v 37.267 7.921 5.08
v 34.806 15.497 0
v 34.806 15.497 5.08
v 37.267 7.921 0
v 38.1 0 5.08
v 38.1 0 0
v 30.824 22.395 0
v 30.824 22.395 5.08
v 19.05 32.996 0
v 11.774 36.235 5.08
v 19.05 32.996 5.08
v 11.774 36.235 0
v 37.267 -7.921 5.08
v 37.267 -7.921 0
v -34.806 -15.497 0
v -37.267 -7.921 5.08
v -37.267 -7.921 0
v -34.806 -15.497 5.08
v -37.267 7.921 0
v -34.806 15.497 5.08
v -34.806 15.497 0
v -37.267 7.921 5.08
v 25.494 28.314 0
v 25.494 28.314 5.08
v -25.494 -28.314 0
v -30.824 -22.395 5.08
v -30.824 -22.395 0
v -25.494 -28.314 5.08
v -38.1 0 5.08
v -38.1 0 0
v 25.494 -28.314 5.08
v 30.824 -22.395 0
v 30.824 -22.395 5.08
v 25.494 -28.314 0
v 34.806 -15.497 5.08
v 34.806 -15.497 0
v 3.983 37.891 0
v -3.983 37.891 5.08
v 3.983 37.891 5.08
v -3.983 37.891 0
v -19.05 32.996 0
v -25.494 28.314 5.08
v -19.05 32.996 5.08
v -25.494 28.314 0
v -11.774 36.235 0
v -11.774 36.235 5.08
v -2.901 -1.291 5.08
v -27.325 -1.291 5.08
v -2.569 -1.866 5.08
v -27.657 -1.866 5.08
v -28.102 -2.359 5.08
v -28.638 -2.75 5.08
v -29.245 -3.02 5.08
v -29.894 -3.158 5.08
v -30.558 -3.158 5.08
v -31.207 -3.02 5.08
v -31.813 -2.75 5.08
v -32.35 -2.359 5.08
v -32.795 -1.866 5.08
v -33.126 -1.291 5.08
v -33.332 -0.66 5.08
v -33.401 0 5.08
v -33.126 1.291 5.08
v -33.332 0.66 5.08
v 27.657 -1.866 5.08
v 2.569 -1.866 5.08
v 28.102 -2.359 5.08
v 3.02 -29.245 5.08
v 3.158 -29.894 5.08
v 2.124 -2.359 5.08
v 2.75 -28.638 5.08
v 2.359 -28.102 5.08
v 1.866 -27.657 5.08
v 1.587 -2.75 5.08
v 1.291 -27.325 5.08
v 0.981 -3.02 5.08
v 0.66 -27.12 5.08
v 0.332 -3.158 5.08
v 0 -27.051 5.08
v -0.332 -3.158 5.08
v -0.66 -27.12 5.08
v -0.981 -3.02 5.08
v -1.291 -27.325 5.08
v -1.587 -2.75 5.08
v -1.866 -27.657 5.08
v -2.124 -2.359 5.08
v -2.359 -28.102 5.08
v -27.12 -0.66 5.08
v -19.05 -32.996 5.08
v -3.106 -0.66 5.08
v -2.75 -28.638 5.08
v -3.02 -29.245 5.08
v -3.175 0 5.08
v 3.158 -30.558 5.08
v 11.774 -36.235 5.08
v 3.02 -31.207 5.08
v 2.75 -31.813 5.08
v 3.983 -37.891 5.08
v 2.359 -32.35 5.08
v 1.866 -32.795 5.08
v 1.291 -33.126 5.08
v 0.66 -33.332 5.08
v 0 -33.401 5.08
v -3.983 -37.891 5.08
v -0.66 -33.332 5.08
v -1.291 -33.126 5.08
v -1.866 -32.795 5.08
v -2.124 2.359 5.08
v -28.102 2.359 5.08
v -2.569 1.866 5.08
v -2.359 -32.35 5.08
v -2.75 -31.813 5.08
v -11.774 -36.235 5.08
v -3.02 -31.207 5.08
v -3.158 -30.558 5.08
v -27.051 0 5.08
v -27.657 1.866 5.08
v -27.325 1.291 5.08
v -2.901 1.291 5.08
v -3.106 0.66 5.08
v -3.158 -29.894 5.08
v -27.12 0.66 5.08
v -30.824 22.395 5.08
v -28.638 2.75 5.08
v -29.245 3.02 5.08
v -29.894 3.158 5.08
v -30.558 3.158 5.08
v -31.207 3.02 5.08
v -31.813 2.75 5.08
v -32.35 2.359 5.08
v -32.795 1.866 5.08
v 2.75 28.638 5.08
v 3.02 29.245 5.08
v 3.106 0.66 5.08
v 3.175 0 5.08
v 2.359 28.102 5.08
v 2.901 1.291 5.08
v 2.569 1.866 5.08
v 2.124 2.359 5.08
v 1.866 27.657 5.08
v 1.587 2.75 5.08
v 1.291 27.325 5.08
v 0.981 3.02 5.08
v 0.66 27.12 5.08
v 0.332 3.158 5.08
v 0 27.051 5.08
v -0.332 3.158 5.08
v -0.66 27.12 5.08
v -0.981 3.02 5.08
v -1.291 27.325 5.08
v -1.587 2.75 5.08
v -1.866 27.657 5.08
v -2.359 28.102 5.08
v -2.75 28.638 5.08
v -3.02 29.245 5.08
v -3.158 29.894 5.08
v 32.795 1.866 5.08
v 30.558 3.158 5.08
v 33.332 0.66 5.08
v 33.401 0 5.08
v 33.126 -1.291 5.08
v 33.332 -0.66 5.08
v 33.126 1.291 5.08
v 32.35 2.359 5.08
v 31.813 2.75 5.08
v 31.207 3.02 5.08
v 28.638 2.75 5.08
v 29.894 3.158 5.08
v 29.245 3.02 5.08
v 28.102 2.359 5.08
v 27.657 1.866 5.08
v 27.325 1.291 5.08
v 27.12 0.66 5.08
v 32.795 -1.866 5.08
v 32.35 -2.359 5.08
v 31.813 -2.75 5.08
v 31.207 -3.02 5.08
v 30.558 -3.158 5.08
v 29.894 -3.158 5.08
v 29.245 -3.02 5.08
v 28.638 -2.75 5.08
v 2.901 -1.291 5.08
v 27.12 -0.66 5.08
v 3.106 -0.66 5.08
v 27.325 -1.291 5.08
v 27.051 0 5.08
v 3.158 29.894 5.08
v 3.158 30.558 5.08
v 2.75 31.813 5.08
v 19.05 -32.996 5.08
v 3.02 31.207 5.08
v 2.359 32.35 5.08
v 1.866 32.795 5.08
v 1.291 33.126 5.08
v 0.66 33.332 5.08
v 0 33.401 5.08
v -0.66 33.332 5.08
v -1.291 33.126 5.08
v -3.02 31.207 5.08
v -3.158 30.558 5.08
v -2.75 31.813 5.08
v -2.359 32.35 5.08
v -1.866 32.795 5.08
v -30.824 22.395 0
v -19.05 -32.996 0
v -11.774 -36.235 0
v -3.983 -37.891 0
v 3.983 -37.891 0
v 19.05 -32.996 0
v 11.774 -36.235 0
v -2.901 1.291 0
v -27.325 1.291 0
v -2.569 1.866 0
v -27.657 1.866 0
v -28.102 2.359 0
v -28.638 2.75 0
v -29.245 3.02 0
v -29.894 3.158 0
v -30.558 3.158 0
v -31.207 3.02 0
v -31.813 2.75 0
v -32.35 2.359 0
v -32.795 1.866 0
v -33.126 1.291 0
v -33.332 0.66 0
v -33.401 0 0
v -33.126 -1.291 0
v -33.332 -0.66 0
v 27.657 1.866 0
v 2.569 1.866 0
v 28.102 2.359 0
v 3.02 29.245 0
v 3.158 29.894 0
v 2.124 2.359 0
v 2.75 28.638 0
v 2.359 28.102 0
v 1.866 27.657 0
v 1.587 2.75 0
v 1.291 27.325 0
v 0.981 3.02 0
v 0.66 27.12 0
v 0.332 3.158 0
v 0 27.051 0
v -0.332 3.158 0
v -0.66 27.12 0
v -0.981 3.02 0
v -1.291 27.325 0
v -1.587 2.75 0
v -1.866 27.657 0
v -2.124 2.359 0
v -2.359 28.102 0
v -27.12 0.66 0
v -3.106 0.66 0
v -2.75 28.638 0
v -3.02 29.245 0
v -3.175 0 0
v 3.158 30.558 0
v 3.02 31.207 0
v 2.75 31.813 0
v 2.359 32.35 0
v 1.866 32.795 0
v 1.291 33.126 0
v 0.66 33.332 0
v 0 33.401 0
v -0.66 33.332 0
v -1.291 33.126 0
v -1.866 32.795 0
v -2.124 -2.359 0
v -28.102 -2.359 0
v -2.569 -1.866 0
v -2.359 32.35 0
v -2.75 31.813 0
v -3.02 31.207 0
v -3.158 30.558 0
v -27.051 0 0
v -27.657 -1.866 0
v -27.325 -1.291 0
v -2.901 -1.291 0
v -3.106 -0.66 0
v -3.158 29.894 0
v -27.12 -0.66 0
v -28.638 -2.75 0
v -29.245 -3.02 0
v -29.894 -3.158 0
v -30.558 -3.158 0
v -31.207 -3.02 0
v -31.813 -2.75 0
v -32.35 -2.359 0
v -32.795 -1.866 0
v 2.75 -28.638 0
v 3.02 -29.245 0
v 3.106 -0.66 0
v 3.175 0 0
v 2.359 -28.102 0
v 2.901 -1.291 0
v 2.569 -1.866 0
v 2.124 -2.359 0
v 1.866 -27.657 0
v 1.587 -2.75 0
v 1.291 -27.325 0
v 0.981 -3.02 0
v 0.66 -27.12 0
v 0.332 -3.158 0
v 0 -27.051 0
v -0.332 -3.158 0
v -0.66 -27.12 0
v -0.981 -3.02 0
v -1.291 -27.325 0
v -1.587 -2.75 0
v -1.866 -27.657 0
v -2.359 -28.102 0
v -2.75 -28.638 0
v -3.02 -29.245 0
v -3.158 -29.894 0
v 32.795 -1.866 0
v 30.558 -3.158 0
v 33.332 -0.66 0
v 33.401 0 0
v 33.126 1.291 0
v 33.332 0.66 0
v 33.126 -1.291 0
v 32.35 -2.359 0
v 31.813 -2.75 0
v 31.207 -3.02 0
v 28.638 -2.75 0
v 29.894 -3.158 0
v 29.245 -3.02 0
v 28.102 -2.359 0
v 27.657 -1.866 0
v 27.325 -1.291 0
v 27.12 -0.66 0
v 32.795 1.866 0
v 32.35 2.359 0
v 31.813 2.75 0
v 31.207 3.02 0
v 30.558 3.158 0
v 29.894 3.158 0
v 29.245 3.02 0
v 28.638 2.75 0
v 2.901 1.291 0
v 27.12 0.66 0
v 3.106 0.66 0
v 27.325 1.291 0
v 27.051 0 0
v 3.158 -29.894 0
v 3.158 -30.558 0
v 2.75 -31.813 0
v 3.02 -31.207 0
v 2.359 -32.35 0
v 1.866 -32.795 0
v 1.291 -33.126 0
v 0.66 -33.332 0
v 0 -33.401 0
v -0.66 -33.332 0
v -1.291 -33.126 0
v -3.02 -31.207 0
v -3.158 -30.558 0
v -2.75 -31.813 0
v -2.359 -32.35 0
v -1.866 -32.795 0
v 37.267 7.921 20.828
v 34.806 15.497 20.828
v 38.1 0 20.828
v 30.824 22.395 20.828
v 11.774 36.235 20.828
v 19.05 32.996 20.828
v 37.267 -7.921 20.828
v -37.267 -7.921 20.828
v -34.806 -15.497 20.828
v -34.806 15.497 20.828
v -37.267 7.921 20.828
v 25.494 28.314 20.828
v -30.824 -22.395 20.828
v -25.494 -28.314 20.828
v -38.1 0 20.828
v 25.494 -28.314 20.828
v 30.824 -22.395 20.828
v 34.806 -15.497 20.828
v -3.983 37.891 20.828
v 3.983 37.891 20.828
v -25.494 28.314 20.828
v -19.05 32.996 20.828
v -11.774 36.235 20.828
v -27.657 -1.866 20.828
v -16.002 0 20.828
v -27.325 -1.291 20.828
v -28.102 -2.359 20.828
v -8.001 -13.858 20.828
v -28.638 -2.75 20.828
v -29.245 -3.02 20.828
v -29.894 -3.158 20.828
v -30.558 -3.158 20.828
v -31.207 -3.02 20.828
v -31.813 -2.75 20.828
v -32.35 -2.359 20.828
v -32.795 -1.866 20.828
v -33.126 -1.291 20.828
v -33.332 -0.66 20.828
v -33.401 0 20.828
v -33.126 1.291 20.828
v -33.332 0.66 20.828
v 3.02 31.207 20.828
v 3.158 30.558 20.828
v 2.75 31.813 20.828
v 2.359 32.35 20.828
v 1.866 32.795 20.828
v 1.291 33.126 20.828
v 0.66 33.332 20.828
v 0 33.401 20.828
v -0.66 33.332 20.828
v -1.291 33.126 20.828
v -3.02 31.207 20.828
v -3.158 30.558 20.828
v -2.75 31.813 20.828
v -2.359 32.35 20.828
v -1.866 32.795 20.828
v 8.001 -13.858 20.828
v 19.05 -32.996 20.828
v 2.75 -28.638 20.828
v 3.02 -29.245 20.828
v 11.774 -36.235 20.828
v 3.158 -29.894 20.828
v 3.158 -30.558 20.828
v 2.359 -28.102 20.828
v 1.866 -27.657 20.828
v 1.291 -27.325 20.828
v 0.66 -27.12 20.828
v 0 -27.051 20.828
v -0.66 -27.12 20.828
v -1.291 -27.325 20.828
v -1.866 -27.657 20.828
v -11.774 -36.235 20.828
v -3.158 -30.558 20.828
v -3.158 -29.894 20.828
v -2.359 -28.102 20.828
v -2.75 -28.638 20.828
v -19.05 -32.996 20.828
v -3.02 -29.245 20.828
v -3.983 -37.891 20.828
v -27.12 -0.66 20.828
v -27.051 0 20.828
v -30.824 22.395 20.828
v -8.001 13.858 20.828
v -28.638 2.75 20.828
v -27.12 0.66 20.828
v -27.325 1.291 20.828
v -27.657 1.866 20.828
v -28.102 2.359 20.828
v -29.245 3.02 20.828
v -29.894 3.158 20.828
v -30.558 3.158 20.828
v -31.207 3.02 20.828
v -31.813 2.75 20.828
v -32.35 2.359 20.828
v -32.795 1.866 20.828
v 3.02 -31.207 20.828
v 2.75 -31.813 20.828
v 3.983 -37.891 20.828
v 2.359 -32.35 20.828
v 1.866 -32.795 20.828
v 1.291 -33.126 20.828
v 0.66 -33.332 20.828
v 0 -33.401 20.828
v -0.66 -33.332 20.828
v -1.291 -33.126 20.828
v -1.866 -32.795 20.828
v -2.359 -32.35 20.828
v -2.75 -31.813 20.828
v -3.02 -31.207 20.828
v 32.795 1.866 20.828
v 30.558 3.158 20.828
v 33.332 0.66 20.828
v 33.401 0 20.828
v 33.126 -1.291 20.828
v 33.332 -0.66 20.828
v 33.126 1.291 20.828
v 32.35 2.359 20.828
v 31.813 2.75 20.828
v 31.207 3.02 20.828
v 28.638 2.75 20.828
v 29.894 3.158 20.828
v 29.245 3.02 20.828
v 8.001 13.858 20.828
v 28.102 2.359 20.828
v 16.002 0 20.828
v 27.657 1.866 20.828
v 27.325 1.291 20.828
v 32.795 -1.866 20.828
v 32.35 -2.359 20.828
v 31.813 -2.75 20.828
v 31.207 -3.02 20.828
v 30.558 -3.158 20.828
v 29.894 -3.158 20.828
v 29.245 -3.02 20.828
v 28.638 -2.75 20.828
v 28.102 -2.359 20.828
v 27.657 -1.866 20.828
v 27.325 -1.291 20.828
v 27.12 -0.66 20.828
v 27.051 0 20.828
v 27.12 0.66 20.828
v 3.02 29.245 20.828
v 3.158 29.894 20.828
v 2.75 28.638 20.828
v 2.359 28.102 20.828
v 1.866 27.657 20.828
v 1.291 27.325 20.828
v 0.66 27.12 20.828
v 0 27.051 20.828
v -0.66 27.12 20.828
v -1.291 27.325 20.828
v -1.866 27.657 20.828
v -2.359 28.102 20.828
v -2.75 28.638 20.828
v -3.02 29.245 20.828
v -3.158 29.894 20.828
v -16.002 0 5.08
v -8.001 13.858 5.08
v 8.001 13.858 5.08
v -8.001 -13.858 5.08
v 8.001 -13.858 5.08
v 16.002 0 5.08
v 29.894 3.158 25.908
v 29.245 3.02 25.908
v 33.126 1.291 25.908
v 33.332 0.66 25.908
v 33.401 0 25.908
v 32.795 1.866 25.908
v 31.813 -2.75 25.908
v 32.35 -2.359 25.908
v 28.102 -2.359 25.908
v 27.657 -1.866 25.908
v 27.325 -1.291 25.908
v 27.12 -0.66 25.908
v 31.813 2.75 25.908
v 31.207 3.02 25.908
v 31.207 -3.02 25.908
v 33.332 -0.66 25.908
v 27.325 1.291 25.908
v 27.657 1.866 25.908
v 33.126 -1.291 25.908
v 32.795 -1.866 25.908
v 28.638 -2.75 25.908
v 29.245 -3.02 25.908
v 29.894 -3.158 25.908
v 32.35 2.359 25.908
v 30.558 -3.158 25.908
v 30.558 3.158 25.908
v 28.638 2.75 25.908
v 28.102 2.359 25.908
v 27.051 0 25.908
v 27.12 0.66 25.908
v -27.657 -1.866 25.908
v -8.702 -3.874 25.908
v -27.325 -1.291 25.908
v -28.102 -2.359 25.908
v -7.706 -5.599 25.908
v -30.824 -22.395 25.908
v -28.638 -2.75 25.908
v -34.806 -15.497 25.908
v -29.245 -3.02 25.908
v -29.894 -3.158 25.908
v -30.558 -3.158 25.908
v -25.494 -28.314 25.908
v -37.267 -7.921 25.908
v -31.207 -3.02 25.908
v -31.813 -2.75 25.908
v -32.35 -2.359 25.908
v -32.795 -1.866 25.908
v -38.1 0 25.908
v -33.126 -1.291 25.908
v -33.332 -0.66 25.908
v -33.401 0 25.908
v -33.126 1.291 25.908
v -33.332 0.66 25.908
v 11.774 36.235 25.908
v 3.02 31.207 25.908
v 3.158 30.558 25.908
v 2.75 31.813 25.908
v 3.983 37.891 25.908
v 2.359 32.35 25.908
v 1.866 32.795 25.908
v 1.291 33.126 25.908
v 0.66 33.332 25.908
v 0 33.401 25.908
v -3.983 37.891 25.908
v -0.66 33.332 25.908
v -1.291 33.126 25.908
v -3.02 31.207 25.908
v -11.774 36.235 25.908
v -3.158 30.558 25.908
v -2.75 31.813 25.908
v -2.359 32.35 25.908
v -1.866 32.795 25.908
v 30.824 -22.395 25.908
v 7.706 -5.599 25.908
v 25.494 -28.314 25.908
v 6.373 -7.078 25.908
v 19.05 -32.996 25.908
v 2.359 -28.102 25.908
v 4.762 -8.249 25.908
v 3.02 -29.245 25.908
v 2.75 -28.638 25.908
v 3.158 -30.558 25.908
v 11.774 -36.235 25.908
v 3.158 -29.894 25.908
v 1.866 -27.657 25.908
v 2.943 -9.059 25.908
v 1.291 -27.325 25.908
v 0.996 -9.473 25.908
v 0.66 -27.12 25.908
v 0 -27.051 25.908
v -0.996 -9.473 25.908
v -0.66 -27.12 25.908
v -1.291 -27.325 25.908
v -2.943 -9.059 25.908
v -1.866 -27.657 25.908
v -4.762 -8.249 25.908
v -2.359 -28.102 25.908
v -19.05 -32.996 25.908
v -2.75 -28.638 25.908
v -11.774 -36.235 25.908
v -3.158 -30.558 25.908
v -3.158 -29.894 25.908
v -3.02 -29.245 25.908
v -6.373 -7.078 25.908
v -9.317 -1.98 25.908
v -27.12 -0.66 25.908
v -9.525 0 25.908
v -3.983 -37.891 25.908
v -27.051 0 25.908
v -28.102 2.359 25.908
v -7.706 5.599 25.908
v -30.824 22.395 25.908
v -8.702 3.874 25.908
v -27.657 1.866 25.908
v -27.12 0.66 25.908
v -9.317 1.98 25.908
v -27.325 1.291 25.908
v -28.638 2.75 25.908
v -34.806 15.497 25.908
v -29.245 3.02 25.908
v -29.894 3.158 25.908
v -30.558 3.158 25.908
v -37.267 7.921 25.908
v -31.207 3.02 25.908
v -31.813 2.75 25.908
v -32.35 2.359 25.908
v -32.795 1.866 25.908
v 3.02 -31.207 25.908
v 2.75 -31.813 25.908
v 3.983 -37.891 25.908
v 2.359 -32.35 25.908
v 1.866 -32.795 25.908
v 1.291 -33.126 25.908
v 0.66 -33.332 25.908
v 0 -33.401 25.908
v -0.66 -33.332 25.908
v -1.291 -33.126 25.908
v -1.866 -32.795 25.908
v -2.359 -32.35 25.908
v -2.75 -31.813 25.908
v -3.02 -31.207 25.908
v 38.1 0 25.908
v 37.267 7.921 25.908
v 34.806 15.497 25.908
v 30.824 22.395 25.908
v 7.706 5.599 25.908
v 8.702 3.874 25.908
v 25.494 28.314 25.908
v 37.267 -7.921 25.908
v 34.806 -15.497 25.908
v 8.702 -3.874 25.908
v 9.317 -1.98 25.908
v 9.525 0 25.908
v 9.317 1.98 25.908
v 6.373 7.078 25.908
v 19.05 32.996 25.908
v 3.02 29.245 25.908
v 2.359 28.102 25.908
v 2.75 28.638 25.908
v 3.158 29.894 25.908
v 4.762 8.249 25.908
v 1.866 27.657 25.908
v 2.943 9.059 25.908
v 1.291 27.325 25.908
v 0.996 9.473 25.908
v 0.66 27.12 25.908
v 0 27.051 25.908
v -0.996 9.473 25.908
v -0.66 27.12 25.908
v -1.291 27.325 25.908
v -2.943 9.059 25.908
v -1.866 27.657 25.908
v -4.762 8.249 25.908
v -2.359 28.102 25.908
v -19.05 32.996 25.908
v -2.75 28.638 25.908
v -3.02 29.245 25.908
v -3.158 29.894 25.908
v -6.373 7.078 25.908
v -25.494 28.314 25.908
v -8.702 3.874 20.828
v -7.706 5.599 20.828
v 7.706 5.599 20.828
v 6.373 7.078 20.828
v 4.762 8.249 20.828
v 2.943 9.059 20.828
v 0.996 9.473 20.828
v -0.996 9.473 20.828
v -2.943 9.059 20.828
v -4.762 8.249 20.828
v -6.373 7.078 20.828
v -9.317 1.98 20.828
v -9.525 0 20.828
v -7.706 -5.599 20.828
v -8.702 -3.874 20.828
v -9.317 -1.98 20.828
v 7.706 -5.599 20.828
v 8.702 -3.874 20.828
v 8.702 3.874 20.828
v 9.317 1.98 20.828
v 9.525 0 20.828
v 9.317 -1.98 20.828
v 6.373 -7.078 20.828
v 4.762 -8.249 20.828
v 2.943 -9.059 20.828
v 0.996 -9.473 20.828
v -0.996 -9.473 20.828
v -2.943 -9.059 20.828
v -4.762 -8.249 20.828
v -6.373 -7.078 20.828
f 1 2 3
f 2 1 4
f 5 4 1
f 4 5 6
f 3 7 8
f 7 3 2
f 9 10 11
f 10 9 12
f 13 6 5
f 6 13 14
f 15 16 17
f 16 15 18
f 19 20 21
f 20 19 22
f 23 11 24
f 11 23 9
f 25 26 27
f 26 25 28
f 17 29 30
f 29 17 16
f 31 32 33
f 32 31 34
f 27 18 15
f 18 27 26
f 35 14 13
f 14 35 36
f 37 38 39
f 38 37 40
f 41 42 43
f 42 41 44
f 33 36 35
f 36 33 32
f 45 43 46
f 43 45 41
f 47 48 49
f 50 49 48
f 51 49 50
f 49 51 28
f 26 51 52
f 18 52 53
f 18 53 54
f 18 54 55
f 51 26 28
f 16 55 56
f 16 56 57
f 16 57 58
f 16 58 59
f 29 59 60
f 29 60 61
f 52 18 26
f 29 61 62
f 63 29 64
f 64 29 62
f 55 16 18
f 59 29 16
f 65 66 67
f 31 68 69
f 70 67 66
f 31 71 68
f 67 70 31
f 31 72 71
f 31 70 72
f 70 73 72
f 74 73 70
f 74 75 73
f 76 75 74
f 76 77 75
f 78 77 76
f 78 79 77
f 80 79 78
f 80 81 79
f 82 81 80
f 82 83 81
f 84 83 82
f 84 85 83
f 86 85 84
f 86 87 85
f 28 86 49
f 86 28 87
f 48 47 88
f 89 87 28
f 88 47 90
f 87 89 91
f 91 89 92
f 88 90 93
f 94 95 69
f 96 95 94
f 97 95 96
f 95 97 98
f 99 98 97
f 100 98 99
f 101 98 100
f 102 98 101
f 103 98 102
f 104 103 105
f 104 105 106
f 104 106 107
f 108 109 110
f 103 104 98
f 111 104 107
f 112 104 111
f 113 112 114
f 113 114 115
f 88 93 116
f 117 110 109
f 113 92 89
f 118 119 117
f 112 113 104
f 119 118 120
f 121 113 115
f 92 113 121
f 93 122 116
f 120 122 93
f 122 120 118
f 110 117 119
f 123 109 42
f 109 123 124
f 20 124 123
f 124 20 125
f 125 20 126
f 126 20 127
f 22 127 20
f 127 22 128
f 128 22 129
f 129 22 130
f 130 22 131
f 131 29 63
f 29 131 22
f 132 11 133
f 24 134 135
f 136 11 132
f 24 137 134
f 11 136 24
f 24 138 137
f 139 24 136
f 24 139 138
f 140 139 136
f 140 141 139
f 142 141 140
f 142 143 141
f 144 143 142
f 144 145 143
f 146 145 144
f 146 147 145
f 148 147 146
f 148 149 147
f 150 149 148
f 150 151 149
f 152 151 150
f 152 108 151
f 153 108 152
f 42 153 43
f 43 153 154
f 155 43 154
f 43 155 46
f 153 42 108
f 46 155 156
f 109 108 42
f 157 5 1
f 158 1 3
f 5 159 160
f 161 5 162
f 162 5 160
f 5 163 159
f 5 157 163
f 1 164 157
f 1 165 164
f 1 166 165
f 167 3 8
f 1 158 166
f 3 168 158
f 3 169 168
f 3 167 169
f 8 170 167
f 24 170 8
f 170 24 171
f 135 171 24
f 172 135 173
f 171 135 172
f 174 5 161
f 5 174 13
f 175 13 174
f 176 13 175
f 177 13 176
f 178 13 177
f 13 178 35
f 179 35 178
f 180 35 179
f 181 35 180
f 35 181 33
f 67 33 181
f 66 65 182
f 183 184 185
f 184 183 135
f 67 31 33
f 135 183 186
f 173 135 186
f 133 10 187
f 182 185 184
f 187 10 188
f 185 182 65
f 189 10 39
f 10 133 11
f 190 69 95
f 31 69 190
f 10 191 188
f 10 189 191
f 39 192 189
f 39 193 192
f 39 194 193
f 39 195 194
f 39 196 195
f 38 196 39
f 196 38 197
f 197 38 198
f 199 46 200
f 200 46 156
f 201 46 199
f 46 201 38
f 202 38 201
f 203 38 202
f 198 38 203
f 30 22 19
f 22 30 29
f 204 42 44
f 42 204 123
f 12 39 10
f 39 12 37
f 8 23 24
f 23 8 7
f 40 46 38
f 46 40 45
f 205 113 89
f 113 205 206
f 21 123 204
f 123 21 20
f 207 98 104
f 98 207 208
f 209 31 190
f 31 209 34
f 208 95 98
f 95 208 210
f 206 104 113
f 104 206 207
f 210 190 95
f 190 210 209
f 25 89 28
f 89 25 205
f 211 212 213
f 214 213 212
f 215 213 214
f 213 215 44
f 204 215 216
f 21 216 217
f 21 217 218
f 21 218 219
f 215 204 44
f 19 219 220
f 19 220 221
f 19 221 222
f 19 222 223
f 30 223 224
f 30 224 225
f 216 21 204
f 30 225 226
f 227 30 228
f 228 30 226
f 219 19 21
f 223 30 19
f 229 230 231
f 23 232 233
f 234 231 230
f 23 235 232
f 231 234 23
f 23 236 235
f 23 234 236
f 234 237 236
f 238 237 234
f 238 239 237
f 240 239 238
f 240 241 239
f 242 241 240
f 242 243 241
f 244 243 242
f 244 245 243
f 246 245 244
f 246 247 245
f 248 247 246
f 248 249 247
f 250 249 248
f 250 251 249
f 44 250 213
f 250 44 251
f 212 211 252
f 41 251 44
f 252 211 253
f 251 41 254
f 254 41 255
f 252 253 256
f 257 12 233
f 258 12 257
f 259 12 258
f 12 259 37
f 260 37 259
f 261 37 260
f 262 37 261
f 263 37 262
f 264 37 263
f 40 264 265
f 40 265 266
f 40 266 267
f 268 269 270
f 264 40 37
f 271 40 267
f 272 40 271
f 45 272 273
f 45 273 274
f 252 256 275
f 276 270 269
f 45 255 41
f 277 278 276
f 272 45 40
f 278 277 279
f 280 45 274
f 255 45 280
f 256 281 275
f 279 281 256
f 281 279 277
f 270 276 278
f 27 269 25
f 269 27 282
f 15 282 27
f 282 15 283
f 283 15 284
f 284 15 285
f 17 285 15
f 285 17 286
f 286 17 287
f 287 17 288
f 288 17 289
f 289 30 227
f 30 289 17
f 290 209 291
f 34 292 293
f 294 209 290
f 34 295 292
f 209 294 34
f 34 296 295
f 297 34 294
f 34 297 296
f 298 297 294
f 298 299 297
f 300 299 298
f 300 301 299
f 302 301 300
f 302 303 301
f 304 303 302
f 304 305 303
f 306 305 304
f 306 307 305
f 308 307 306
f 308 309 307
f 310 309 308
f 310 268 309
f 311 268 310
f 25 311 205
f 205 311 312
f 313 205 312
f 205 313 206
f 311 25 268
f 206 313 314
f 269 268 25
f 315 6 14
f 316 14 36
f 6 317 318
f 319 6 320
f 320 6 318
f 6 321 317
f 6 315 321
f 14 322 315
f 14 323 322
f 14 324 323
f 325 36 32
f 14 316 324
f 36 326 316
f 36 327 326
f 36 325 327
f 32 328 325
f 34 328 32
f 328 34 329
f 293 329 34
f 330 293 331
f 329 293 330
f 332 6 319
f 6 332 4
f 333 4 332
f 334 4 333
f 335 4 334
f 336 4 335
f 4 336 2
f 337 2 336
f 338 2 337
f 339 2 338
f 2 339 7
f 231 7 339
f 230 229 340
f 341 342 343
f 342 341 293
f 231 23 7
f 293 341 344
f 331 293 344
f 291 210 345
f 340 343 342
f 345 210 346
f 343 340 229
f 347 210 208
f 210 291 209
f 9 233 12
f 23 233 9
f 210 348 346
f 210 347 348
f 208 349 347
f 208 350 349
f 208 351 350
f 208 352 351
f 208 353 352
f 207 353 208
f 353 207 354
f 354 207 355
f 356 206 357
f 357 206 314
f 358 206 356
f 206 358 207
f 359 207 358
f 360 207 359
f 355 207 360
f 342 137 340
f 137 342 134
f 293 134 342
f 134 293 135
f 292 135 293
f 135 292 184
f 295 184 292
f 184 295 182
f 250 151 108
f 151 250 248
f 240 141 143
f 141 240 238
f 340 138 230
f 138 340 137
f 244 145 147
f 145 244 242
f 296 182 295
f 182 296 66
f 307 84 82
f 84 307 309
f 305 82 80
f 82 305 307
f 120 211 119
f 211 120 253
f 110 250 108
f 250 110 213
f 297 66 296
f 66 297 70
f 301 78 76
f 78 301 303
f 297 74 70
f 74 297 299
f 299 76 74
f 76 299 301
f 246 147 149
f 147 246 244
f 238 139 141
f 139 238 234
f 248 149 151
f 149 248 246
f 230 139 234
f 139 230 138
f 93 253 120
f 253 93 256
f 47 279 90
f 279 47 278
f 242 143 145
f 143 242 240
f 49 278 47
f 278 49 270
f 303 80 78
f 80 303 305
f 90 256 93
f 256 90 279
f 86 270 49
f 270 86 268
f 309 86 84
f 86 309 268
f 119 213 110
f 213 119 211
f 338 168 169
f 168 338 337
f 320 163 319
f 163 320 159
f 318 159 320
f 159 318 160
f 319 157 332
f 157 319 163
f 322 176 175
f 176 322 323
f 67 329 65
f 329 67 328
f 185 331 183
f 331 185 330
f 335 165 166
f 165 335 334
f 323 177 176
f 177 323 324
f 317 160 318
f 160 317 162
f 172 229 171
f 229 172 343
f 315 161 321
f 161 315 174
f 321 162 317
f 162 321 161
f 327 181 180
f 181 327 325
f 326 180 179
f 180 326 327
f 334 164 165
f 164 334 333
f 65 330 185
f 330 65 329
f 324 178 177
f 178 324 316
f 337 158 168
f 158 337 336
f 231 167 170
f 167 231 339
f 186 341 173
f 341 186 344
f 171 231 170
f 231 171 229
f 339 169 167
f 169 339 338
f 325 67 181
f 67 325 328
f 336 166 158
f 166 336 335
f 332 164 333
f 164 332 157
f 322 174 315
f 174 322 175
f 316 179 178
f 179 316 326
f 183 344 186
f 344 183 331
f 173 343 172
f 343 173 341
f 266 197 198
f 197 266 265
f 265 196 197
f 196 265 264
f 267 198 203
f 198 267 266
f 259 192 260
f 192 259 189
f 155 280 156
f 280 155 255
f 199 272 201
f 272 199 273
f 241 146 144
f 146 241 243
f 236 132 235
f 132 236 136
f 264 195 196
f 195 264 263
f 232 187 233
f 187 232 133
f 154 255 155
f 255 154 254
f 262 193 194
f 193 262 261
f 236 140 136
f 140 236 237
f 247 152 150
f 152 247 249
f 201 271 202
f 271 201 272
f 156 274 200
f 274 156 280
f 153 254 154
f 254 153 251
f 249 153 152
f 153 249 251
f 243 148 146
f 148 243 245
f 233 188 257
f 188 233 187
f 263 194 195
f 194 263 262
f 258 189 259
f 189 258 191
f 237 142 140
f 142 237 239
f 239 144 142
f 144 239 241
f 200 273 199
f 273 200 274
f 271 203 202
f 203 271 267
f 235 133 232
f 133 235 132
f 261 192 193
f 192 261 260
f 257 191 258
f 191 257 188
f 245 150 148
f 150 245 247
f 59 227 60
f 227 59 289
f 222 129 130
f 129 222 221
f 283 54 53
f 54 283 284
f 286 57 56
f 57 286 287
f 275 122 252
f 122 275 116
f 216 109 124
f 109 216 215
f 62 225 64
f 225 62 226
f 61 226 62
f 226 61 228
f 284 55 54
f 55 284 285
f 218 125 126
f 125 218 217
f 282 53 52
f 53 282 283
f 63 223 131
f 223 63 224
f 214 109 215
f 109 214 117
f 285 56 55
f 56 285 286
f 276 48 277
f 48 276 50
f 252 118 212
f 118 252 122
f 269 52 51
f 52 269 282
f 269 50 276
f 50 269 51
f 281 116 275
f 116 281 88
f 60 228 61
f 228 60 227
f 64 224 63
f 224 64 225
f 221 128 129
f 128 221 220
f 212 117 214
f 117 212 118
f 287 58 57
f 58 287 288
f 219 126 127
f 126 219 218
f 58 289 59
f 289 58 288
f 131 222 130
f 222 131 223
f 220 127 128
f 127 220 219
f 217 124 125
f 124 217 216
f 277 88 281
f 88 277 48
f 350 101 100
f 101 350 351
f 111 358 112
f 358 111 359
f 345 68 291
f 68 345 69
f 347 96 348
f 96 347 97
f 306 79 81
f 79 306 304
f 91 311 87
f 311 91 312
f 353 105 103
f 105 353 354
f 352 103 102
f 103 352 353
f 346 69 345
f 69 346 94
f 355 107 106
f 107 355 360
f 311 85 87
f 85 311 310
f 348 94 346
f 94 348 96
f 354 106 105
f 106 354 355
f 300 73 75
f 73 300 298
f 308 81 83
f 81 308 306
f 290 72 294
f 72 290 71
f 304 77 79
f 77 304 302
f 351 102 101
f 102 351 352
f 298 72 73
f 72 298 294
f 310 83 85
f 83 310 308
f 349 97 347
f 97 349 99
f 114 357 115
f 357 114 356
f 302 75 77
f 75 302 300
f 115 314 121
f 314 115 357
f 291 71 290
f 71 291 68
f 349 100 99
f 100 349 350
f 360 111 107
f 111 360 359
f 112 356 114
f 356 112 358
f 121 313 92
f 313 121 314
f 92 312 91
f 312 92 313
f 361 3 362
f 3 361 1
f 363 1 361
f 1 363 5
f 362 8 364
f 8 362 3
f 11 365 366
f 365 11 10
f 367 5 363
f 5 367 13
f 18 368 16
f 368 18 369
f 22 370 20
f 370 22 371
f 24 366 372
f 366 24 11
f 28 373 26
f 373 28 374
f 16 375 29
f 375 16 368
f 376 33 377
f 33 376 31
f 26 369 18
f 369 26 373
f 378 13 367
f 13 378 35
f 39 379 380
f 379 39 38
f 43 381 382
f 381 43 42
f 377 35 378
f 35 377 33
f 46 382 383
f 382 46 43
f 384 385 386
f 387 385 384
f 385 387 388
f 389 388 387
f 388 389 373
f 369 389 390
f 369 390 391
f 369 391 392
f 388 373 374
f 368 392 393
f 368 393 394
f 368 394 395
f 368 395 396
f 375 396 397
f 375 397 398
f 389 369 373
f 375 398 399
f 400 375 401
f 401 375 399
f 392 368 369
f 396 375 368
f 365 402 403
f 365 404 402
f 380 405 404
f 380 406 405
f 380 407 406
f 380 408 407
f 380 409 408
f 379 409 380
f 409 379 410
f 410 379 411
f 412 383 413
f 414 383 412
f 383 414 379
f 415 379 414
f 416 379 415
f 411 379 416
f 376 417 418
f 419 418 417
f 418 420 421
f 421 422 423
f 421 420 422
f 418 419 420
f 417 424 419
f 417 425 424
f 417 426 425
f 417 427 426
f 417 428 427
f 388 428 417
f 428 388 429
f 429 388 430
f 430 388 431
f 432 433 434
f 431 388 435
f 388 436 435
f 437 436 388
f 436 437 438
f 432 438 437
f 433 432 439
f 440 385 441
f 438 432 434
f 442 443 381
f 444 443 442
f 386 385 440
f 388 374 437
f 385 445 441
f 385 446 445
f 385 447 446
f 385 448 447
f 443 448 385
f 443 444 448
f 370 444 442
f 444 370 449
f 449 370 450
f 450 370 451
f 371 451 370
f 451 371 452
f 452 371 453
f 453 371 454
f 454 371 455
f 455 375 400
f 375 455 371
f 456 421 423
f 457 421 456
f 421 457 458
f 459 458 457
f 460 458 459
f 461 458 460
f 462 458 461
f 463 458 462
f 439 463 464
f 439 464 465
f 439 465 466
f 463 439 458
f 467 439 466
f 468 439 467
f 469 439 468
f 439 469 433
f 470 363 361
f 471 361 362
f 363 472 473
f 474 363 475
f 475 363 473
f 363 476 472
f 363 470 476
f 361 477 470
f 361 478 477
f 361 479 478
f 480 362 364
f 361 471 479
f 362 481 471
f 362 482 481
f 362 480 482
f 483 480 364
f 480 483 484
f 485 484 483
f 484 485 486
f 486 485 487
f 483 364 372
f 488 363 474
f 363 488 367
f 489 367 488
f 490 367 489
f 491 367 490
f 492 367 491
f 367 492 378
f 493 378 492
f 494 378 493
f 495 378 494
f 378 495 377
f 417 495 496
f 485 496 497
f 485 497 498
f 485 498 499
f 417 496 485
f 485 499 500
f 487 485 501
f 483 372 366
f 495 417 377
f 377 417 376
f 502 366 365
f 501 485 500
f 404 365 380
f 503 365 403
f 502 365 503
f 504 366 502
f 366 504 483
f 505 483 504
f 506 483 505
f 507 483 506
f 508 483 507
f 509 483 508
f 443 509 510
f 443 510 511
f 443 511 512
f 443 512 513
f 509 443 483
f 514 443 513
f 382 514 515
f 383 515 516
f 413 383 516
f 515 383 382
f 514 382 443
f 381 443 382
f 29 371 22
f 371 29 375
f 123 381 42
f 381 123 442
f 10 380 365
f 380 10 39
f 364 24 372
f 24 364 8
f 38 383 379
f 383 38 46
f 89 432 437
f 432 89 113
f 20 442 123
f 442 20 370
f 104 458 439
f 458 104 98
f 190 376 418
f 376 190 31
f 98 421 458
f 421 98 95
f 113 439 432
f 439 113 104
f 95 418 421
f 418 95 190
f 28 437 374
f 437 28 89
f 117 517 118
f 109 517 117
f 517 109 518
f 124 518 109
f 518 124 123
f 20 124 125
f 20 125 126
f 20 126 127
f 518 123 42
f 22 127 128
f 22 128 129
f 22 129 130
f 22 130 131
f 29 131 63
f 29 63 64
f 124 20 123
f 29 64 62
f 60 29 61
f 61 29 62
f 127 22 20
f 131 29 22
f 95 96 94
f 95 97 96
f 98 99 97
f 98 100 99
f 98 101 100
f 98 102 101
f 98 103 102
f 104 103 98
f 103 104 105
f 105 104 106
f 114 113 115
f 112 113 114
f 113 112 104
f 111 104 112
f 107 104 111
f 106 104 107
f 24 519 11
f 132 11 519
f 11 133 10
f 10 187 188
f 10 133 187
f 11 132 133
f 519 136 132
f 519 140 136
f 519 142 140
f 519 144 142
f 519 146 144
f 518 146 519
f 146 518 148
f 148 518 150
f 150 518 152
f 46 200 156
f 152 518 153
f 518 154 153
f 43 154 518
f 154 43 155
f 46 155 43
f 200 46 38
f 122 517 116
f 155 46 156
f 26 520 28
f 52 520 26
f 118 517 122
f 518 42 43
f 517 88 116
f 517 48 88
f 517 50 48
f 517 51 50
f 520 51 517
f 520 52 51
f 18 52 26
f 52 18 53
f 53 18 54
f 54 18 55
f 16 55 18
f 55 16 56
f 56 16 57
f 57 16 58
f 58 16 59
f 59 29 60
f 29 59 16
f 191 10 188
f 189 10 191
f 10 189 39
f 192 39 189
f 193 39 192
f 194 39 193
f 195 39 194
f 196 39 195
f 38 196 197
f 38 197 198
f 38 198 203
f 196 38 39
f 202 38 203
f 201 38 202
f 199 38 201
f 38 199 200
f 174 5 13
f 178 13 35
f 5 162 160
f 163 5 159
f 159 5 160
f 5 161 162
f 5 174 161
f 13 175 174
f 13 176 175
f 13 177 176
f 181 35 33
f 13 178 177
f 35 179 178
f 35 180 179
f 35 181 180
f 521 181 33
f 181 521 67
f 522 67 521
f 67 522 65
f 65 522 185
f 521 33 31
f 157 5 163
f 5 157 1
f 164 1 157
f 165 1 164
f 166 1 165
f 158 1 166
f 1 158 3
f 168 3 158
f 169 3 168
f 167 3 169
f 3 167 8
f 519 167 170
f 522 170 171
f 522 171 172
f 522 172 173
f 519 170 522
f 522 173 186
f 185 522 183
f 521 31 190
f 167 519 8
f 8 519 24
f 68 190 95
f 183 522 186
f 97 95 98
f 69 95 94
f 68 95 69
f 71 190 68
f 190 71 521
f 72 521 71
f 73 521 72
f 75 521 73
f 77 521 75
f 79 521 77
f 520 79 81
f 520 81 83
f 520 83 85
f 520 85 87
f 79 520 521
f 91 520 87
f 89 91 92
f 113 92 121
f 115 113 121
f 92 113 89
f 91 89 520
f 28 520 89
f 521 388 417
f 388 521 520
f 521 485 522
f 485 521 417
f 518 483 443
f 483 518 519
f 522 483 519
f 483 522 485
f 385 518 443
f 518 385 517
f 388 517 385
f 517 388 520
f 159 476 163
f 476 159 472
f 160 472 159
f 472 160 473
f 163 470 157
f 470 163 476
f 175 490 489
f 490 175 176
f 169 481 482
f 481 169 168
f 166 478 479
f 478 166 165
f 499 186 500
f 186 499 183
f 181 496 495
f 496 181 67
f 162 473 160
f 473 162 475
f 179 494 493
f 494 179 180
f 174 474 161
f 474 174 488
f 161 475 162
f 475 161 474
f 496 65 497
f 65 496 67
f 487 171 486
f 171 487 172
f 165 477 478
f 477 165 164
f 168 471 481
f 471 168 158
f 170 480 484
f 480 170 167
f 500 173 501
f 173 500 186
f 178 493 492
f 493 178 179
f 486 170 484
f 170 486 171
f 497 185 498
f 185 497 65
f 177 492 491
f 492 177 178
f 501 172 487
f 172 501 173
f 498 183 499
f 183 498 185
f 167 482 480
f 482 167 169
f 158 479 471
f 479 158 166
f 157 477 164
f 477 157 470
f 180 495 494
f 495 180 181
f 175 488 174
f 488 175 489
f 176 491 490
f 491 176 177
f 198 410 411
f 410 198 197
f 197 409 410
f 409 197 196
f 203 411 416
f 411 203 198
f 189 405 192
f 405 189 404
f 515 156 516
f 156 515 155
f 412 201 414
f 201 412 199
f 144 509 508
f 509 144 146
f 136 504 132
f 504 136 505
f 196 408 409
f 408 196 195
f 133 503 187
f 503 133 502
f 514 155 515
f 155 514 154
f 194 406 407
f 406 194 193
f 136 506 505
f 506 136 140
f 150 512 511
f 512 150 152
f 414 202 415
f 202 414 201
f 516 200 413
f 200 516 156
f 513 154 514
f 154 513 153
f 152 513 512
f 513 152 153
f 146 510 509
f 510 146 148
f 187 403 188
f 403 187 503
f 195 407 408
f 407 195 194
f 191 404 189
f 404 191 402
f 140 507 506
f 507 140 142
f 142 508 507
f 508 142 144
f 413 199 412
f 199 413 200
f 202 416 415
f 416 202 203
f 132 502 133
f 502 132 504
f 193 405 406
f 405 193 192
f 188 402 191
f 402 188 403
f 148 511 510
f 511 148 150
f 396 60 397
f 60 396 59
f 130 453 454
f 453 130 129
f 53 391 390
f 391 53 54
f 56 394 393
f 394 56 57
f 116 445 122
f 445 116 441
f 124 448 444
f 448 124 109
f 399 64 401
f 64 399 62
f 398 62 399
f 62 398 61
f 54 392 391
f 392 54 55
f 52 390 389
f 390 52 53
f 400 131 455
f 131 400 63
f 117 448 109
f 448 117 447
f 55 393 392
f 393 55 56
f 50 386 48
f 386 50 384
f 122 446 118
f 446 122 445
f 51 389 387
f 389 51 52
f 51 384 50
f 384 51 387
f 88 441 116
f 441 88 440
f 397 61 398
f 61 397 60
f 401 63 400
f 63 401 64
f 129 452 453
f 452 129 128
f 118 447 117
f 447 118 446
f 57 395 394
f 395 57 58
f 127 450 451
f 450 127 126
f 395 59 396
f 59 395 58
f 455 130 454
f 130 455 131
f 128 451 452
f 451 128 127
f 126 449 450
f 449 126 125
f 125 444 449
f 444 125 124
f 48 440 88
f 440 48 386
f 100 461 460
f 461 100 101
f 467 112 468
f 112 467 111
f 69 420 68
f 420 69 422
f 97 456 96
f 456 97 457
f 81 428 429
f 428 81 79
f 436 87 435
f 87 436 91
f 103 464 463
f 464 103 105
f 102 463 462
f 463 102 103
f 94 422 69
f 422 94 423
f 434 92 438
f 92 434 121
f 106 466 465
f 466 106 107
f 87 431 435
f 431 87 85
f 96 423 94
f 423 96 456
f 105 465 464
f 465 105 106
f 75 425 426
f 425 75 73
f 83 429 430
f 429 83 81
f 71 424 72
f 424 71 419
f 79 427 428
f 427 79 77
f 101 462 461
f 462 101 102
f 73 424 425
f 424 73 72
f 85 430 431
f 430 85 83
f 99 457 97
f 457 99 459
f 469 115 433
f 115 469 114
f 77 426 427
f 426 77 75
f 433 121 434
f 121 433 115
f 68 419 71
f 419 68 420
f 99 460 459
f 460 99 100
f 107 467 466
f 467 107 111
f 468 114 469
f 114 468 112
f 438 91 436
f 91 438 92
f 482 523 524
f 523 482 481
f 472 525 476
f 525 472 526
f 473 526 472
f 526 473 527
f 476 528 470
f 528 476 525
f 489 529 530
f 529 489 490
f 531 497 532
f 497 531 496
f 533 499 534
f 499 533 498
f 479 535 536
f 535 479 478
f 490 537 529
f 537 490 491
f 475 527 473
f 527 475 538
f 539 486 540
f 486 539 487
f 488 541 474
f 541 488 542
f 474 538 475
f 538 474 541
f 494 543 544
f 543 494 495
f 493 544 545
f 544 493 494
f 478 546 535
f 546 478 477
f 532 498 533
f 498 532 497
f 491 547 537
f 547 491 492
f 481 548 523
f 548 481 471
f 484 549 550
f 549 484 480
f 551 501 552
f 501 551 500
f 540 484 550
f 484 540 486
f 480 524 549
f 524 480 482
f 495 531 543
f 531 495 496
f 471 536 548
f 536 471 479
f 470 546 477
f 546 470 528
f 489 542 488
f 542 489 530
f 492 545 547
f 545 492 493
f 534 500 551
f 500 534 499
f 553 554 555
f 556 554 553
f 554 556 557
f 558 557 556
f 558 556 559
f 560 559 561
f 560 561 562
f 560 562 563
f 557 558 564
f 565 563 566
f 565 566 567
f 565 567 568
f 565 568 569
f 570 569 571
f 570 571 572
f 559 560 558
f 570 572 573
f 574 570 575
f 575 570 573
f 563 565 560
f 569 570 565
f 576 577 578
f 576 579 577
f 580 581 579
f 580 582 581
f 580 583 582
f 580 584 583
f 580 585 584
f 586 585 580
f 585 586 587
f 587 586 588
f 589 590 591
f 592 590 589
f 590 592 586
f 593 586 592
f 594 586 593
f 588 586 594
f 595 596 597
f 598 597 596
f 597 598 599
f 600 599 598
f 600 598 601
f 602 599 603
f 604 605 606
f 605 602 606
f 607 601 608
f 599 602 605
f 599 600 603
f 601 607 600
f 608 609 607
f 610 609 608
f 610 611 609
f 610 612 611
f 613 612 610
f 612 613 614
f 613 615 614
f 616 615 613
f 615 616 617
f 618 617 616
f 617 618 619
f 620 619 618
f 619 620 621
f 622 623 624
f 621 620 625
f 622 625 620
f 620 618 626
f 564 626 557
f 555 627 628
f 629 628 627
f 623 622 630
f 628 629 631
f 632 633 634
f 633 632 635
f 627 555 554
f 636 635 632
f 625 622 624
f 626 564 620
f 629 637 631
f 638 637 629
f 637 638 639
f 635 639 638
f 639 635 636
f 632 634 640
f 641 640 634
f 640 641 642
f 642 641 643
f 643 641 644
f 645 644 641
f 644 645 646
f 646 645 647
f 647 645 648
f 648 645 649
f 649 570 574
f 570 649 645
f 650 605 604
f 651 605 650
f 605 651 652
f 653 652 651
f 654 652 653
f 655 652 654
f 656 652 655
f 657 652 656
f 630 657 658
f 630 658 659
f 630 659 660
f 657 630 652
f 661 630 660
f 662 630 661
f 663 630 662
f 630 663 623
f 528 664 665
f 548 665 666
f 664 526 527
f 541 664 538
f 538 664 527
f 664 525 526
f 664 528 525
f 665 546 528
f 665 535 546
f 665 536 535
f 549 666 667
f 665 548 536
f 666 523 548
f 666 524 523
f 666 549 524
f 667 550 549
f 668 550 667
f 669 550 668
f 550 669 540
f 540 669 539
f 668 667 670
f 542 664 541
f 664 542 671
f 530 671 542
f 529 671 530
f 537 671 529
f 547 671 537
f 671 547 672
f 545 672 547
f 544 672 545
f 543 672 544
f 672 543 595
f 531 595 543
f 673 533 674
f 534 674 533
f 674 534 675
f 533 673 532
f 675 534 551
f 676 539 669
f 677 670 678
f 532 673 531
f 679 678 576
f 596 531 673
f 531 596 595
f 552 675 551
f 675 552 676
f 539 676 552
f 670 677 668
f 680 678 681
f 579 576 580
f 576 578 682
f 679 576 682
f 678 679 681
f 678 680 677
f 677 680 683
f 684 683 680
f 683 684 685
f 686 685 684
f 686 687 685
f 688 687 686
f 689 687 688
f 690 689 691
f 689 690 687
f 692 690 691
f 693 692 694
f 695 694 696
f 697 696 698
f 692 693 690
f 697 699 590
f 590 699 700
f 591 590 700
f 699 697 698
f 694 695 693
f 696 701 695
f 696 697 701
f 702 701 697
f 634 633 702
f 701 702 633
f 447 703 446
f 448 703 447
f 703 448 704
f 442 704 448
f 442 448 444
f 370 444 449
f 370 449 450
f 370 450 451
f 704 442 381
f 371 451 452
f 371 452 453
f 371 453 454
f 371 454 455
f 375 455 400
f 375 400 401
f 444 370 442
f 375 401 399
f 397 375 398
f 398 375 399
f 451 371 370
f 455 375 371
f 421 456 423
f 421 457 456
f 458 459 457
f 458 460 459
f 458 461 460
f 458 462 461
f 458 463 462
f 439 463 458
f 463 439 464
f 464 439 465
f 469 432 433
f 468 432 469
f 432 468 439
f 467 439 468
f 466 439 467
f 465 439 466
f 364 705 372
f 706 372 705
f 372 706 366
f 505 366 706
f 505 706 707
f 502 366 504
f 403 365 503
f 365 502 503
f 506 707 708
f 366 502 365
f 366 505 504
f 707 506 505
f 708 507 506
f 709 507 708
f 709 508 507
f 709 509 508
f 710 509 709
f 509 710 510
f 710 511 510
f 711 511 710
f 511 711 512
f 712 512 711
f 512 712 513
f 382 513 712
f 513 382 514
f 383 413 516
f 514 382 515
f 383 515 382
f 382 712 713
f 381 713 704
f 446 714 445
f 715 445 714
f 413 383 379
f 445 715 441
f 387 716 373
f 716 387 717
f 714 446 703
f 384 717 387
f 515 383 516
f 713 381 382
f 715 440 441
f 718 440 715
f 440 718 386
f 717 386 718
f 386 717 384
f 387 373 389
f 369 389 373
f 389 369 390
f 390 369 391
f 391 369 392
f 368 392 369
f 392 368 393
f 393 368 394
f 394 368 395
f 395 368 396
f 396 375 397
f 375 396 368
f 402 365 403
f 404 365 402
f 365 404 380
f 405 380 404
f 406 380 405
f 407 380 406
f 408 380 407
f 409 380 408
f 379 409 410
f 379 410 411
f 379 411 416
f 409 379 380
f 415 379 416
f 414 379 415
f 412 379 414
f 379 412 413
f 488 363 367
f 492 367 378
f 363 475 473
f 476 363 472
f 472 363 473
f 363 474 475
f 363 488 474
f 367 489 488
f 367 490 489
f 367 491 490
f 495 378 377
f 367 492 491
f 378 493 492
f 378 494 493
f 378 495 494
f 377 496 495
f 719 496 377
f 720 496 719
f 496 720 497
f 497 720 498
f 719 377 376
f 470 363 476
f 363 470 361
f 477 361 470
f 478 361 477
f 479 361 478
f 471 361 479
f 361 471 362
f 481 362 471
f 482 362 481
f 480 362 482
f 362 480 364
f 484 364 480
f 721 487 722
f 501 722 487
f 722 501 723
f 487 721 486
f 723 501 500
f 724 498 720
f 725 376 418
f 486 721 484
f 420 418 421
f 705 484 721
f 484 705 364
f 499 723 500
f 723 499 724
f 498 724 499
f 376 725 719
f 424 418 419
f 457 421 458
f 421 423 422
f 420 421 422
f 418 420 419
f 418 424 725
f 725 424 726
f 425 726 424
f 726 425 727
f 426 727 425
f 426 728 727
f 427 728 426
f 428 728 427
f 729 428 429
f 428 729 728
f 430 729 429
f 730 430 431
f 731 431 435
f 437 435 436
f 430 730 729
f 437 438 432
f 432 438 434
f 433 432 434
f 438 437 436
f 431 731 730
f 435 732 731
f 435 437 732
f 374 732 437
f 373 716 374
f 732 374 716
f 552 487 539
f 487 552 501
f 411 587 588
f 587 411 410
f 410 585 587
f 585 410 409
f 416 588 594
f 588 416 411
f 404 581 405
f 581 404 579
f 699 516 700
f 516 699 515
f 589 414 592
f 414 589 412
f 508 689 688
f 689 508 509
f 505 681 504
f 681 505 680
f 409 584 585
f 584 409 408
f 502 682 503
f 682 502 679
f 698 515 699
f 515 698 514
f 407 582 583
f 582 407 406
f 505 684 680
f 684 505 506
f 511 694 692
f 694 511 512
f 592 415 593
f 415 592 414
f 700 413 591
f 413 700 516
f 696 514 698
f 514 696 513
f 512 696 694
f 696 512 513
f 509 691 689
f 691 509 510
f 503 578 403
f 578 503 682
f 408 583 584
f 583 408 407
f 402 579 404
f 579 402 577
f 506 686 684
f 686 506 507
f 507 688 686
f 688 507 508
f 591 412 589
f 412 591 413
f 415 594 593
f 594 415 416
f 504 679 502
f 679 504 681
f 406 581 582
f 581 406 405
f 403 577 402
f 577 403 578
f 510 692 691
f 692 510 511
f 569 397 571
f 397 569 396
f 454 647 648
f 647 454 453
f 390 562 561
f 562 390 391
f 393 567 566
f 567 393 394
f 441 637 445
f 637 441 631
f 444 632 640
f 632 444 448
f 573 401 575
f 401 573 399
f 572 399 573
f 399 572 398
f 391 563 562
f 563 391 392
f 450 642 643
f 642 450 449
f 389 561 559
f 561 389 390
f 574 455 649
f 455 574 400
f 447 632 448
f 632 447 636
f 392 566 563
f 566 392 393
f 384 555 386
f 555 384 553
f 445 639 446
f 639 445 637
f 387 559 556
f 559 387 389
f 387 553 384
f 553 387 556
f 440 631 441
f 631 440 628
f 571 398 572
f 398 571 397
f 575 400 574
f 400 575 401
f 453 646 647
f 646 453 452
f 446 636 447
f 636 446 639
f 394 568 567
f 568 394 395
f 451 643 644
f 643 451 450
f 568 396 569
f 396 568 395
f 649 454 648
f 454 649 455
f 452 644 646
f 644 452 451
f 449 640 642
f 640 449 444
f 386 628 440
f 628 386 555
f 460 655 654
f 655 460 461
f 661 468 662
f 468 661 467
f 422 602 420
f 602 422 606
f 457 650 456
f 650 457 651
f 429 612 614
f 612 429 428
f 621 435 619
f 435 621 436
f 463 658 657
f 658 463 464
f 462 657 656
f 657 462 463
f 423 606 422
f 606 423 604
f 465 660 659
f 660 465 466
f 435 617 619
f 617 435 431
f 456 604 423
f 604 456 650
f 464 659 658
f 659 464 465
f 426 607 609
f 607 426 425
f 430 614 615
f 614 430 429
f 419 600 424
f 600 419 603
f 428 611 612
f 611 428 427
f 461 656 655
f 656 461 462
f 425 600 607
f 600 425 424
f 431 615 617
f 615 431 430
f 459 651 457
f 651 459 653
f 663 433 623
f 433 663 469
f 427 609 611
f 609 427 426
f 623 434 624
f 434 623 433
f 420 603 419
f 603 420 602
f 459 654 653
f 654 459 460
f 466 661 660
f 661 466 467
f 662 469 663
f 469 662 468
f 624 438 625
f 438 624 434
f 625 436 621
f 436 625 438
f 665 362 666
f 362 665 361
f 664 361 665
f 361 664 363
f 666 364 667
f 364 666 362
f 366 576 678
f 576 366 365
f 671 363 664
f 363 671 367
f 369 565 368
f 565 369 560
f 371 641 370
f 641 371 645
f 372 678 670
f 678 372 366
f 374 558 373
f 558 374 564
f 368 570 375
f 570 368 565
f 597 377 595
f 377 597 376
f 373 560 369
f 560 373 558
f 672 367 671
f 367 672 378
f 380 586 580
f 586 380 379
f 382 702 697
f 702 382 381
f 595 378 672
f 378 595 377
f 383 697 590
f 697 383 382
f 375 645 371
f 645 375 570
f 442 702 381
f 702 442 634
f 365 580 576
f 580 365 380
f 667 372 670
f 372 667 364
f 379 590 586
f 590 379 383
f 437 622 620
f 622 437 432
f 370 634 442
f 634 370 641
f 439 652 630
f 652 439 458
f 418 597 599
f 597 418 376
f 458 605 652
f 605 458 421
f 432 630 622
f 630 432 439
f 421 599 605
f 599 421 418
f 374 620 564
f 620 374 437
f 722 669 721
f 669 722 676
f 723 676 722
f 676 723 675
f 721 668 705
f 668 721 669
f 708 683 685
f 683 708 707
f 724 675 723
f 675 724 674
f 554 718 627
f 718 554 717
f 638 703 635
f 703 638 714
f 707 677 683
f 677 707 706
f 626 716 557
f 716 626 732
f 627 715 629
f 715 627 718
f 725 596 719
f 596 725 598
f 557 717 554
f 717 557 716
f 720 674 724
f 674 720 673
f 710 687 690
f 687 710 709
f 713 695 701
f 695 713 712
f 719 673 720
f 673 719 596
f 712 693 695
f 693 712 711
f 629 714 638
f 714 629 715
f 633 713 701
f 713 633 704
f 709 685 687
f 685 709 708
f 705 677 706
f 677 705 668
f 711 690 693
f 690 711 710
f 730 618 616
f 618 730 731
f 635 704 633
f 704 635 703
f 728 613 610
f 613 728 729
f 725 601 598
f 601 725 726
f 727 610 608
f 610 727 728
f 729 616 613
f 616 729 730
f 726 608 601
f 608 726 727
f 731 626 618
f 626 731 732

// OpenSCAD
//Chuck Adapter for Wooden Lathe

spindle=.75;

chuck=3;

nutsize=1.26; //longest point to point outside of nut
nutthick=.62;

materialthick=.2;

centerbolt=.25;

mountholenum=4;
mountholedia=.25;

res=30;

module nut(){
difference(){
cylinder(h=nutthick, d=nutsize, center=true, $fn=6);
cylinder(h=nutthick, d=spindle, center=true, $fn=res);
}
}

module solidnut(){
difference(){
    cylinder(h=nutthick, d=nutsize, center=true, $fn=6);
}
}

module nutspindle(){
    difference(){
        difference(){
        cylinder(h=materialthick, d=chuck, center=true, $fn=res);
        cylinder(h=materialthick, d=spindle, center=true, $fn=res);
    }
    for (i=[0:mountholenum])
        {rotate([0,0,i*360/mountholenum])
        translate ([(chuck/2-(nutthick/2)), 0, 0])cylinder(h=materialthick, d=mountholedia, center=true, $fn=res);}
}
}


module mountnut(){
    difference(){
        difference(){
        cylinder(h=nutthick, d=chuck, center=true, $fn=res);
        solidnut();
    }
    for (i=[0:mountholenum])
        {rotate([0,0,i*360/mountholenum])
        translate ([(chuck/2-(nutthick/2)), 0, 0])cylinder(h=nutthick, d=mountholedia, center=true, $fn=res);}
}
}

module mountplate(){
difference(){
    difference(){
        cylinder(h=materialthick, d=chuck, center=true, $fn=res);
        cylinder(h=materialthick, d=centerbolt, center=true, $fn=res);
    }
    for (i=[0:mountholenum])
        {rotate([0,0,i*360/mountholenum])
        translate ([(chuck/2-(nutthick/2)), 0, 0])cylinder(h=materialthick, d=mountholedia, center=true, $fn=res);}
}
}


module fulladapter(){
    translate([0,0,.5*materialthick]) mountplate();
    translate([0,0, materialthick+.5*nutthick]) mountnut();
    translate([0,0,(materialthick+nutthick+.5*materialthick)]) nutspindle();
}

scale([25.4,25.4,25.4])

fulladapter();
//mountplate();
//mountnut();
//nutspindle();
